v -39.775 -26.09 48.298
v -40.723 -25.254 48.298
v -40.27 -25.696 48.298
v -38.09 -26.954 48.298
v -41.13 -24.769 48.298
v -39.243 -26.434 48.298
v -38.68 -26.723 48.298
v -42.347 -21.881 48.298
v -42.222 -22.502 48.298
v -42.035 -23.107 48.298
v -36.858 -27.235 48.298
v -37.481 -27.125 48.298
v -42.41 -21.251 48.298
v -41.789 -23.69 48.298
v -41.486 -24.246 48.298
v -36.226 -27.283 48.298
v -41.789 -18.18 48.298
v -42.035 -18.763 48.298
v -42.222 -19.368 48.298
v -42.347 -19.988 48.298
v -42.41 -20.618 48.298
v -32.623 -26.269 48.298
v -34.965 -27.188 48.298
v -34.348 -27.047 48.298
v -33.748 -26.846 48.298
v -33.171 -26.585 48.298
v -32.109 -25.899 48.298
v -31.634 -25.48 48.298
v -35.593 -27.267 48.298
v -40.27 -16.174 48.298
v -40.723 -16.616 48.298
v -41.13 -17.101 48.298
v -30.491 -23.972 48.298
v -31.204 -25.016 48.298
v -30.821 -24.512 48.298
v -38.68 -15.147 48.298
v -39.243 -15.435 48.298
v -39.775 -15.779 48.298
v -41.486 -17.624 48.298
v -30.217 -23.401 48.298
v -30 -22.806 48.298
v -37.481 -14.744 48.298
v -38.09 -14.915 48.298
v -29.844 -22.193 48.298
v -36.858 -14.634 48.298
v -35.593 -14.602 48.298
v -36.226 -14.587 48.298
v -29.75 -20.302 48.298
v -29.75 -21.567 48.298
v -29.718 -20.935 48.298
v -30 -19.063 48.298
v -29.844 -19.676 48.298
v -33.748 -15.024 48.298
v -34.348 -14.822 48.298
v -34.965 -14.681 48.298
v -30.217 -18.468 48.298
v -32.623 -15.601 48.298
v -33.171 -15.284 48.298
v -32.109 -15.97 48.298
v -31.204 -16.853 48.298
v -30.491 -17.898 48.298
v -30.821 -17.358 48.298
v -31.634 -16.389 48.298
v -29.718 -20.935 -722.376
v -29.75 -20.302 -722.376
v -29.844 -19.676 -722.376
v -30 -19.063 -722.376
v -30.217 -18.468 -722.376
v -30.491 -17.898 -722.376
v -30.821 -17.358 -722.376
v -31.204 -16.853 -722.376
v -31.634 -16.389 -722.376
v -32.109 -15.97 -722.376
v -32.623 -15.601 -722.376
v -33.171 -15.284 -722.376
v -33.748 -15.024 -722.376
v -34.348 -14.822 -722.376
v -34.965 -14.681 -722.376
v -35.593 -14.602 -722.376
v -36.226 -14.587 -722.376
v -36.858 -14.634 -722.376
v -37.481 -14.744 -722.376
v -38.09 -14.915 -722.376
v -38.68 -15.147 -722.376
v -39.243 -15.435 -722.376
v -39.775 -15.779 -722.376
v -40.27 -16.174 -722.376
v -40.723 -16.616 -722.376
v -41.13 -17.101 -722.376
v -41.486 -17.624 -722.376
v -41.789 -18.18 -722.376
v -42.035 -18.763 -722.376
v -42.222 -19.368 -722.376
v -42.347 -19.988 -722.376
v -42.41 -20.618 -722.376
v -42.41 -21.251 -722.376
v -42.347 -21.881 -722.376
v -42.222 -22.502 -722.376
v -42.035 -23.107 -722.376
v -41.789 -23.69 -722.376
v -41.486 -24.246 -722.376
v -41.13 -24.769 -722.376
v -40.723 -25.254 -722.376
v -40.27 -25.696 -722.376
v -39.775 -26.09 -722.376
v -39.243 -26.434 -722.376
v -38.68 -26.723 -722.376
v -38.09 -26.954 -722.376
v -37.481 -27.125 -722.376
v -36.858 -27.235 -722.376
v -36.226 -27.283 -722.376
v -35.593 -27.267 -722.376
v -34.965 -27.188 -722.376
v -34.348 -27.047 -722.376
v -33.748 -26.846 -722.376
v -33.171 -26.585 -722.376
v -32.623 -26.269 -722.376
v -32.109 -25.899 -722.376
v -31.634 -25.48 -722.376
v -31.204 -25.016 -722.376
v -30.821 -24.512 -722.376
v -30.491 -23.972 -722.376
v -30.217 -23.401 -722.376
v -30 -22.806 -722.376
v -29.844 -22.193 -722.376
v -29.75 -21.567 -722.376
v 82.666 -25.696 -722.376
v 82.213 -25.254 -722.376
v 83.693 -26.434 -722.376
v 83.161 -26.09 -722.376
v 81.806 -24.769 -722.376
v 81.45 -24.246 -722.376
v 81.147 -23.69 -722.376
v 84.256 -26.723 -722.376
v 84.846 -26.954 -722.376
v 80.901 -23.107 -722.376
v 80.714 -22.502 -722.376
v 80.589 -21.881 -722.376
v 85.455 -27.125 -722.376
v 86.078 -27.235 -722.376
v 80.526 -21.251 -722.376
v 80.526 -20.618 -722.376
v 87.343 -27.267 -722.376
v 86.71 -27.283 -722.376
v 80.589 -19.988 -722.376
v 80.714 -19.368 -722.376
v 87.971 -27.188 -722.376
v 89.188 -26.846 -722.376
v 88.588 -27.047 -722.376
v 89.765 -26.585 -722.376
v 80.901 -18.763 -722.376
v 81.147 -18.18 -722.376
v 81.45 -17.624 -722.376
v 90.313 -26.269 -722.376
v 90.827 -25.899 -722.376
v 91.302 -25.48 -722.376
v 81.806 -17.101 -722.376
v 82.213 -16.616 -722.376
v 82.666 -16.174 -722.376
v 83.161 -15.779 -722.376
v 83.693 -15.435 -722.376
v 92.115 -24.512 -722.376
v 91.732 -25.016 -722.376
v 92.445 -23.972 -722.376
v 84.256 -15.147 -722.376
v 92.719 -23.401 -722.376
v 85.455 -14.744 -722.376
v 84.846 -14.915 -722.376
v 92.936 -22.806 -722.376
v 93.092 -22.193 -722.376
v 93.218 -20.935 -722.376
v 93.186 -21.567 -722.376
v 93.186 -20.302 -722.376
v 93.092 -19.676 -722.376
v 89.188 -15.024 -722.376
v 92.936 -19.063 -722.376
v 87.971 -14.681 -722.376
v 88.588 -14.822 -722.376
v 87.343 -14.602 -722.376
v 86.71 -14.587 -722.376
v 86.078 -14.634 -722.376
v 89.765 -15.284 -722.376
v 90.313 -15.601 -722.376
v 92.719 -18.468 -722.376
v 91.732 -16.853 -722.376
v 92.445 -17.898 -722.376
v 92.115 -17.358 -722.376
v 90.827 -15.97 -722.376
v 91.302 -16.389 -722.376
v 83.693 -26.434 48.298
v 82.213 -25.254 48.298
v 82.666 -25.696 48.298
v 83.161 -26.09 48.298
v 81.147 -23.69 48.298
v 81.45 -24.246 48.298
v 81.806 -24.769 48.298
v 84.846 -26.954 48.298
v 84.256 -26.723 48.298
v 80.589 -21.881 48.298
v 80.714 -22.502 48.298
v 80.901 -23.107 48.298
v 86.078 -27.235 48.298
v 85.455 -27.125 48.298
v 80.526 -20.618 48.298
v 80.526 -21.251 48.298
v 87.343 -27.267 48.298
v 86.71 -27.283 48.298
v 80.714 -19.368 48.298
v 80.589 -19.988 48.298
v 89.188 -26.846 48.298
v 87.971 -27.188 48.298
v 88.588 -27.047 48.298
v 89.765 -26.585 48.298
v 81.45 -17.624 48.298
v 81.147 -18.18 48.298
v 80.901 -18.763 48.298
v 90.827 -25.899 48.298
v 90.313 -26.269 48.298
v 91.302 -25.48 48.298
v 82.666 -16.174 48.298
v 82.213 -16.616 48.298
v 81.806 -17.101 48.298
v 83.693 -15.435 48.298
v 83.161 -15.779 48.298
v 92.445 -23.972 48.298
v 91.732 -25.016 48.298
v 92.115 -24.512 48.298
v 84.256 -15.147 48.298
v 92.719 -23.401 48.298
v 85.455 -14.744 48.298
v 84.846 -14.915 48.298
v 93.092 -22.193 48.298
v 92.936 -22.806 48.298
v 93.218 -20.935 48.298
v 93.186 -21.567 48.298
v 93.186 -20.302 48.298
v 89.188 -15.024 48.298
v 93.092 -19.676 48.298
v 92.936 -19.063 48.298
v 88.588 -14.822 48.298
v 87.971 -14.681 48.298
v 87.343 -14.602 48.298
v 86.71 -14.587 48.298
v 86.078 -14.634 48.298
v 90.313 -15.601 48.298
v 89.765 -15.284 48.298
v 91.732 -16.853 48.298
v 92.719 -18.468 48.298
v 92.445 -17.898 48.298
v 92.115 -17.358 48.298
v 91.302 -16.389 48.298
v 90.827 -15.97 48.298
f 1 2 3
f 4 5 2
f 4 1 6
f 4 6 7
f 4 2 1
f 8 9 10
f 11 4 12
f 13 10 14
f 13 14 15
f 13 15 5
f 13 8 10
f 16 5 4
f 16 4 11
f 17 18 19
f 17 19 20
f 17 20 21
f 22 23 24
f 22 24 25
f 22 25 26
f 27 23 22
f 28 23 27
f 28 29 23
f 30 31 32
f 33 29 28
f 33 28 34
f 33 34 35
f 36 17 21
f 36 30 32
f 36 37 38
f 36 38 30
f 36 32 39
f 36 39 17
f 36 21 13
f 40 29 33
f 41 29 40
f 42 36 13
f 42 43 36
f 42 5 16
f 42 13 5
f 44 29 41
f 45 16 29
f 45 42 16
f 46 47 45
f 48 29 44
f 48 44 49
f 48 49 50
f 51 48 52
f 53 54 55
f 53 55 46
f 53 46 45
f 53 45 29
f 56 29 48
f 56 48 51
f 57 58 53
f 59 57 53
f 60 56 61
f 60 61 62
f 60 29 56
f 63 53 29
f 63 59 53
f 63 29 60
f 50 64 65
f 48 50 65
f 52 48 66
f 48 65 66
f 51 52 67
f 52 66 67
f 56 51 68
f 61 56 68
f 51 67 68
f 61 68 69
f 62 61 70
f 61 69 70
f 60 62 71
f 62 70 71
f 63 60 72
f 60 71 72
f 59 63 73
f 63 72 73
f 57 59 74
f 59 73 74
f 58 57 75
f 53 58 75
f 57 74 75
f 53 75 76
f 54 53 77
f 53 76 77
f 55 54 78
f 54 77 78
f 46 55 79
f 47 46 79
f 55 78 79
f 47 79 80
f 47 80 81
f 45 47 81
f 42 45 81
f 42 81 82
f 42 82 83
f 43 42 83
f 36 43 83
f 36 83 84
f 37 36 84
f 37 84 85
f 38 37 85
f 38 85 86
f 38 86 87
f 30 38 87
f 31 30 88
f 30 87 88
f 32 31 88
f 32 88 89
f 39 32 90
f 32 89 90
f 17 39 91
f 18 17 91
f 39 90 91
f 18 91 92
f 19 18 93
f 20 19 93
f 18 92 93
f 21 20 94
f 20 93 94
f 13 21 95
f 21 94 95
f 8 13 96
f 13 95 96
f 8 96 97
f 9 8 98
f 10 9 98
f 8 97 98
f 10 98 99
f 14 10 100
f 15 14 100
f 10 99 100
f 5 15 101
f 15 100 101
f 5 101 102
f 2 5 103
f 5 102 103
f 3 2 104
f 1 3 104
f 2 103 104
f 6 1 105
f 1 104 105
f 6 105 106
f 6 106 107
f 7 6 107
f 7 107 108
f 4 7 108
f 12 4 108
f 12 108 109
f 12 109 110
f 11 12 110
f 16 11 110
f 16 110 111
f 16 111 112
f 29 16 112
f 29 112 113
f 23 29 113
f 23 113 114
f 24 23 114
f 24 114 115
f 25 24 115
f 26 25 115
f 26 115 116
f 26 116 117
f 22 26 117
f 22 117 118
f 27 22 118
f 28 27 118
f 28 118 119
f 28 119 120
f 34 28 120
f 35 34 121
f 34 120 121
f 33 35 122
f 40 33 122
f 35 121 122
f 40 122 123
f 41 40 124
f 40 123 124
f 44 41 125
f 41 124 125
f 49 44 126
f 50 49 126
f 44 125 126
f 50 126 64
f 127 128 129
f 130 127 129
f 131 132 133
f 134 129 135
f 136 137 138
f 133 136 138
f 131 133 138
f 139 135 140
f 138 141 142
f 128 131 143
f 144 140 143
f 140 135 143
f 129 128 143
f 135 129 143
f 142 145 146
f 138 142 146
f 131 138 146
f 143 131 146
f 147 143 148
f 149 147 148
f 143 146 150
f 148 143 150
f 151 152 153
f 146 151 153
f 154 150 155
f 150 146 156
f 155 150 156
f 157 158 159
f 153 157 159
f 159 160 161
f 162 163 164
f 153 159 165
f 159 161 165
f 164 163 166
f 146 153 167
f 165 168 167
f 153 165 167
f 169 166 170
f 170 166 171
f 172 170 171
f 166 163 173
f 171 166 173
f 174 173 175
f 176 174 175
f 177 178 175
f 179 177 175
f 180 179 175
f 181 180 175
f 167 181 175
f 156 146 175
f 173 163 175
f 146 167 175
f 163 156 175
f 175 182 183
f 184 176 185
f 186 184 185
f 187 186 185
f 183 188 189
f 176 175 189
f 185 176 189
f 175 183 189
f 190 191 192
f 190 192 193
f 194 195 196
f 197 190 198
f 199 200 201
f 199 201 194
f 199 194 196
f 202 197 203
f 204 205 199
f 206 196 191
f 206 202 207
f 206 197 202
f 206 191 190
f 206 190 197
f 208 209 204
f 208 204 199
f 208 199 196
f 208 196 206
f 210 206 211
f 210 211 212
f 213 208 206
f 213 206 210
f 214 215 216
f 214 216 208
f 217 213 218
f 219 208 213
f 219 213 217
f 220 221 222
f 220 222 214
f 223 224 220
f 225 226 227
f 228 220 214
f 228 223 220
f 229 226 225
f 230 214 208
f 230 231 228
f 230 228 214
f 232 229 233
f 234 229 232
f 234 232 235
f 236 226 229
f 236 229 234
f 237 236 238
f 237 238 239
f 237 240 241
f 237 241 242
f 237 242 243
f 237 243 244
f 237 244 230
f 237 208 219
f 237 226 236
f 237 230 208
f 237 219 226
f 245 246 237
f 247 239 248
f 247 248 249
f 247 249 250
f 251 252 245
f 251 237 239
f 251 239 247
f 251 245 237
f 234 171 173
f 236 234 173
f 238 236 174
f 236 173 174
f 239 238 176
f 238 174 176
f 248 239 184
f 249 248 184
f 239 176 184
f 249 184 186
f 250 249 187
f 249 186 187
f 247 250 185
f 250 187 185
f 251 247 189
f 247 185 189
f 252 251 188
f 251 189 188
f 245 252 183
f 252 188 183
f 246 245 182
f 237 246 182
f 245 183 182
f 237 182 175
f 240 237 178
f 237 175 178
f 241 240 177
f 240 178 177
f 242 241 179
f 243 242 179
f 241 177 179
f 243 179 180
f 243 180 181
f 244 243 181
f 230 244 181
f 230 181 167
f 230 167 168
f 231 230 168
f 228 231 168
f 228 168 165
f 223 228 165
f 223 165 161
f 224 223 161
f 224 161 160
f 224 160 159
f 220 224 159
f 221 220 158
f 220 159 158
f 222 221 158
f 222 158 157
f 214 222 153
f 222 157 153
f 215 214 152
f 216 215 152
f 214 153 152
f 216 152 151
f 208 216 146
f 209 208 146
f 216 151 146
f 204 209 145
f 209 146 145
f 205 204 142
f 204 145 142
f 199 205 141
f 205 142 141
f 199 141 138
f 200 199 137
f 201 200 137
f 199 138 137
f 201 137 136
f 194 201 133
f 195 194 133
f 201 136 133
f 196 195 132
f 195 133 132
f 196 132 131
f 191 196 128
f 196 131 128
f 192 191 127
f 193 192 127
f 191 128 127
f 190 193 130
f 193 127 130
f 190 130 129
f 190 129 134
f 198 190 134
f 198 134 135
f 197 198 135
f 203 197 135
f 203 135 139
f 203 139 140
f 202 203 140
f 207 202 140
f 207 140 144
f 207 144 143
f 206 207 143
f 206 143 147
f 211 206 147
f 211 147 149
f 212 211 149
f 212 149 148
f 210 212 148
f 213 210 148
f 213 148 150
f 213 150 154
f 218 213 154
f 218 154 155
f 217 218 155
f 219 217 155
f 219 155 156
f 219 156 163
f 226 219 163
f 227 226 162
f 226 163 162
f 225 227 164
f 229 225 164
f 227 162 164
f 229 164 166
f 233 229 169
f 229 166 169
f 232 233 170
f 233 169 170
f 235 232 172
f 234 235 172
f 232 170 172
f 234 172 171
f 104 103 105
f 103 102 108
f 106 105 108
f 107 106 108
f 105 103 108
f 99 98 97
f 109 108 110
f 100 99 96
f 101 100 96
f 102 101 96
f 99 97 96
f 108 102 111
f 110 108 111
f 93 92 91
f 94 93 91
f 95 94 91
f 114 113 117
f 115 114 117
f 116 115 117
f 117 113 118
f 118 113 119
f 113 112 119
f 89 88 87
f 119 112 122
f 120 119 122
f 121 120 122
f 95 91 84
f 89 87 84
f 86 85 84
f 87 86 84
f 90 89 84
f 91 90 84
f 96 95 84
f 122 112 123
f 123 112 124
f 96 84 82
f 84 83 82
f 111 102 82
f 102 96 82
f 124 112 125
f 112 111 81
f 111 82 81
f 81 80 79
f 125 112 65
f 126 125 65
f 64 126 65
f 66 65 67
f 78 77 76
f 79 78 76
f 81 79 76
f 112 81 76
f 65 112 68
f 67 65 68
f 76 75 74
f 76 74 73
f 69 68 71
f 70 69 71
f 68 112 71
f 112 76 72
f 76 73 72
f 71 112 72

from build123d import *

# Parameters (mm, degrees)
BOSS_EXTRUDE2_OUTLINE_R   = 6.35
BOSS_EXTRUDE2_DEPTH       = 770.6741
BOSS_EXTRUDE2_2_OUTLINE_R = 6.35
BOSS_EXTRUDE2_2_DEPTH     = 770.6741


with BuildPart() as part:
    # Boss-Extrude2: read off the stored shape, not the designer's step
    # Boss-Extrude2 outline → Boss-Extrude2 (new body)
    with BuildSketch(Plane.XY.offset(-722.376)):
        with Locations((86.868, -20.93468)):
            Circle(BOSS_EXTRUDE2_OUTLINE_R)
    extrude(amount=BOSS_EXTRUDE2_DEPTH)


with BuildPart() as body_2:
    # Boss-Extrude2 2 outline → Boss-Extrude2 2 (new body)
    with BuildSketch(Plane.XY.offset(-722.376)):
        with Locations((-36.068, -20.93468)):
            Circle(BOSS_EXTRUDE2_2_OUTLINE_R)
    extrude(amount=BOSS_EXTRUDE2_2_DEPTH)


solid = Compound([part.part, body_2.part])
